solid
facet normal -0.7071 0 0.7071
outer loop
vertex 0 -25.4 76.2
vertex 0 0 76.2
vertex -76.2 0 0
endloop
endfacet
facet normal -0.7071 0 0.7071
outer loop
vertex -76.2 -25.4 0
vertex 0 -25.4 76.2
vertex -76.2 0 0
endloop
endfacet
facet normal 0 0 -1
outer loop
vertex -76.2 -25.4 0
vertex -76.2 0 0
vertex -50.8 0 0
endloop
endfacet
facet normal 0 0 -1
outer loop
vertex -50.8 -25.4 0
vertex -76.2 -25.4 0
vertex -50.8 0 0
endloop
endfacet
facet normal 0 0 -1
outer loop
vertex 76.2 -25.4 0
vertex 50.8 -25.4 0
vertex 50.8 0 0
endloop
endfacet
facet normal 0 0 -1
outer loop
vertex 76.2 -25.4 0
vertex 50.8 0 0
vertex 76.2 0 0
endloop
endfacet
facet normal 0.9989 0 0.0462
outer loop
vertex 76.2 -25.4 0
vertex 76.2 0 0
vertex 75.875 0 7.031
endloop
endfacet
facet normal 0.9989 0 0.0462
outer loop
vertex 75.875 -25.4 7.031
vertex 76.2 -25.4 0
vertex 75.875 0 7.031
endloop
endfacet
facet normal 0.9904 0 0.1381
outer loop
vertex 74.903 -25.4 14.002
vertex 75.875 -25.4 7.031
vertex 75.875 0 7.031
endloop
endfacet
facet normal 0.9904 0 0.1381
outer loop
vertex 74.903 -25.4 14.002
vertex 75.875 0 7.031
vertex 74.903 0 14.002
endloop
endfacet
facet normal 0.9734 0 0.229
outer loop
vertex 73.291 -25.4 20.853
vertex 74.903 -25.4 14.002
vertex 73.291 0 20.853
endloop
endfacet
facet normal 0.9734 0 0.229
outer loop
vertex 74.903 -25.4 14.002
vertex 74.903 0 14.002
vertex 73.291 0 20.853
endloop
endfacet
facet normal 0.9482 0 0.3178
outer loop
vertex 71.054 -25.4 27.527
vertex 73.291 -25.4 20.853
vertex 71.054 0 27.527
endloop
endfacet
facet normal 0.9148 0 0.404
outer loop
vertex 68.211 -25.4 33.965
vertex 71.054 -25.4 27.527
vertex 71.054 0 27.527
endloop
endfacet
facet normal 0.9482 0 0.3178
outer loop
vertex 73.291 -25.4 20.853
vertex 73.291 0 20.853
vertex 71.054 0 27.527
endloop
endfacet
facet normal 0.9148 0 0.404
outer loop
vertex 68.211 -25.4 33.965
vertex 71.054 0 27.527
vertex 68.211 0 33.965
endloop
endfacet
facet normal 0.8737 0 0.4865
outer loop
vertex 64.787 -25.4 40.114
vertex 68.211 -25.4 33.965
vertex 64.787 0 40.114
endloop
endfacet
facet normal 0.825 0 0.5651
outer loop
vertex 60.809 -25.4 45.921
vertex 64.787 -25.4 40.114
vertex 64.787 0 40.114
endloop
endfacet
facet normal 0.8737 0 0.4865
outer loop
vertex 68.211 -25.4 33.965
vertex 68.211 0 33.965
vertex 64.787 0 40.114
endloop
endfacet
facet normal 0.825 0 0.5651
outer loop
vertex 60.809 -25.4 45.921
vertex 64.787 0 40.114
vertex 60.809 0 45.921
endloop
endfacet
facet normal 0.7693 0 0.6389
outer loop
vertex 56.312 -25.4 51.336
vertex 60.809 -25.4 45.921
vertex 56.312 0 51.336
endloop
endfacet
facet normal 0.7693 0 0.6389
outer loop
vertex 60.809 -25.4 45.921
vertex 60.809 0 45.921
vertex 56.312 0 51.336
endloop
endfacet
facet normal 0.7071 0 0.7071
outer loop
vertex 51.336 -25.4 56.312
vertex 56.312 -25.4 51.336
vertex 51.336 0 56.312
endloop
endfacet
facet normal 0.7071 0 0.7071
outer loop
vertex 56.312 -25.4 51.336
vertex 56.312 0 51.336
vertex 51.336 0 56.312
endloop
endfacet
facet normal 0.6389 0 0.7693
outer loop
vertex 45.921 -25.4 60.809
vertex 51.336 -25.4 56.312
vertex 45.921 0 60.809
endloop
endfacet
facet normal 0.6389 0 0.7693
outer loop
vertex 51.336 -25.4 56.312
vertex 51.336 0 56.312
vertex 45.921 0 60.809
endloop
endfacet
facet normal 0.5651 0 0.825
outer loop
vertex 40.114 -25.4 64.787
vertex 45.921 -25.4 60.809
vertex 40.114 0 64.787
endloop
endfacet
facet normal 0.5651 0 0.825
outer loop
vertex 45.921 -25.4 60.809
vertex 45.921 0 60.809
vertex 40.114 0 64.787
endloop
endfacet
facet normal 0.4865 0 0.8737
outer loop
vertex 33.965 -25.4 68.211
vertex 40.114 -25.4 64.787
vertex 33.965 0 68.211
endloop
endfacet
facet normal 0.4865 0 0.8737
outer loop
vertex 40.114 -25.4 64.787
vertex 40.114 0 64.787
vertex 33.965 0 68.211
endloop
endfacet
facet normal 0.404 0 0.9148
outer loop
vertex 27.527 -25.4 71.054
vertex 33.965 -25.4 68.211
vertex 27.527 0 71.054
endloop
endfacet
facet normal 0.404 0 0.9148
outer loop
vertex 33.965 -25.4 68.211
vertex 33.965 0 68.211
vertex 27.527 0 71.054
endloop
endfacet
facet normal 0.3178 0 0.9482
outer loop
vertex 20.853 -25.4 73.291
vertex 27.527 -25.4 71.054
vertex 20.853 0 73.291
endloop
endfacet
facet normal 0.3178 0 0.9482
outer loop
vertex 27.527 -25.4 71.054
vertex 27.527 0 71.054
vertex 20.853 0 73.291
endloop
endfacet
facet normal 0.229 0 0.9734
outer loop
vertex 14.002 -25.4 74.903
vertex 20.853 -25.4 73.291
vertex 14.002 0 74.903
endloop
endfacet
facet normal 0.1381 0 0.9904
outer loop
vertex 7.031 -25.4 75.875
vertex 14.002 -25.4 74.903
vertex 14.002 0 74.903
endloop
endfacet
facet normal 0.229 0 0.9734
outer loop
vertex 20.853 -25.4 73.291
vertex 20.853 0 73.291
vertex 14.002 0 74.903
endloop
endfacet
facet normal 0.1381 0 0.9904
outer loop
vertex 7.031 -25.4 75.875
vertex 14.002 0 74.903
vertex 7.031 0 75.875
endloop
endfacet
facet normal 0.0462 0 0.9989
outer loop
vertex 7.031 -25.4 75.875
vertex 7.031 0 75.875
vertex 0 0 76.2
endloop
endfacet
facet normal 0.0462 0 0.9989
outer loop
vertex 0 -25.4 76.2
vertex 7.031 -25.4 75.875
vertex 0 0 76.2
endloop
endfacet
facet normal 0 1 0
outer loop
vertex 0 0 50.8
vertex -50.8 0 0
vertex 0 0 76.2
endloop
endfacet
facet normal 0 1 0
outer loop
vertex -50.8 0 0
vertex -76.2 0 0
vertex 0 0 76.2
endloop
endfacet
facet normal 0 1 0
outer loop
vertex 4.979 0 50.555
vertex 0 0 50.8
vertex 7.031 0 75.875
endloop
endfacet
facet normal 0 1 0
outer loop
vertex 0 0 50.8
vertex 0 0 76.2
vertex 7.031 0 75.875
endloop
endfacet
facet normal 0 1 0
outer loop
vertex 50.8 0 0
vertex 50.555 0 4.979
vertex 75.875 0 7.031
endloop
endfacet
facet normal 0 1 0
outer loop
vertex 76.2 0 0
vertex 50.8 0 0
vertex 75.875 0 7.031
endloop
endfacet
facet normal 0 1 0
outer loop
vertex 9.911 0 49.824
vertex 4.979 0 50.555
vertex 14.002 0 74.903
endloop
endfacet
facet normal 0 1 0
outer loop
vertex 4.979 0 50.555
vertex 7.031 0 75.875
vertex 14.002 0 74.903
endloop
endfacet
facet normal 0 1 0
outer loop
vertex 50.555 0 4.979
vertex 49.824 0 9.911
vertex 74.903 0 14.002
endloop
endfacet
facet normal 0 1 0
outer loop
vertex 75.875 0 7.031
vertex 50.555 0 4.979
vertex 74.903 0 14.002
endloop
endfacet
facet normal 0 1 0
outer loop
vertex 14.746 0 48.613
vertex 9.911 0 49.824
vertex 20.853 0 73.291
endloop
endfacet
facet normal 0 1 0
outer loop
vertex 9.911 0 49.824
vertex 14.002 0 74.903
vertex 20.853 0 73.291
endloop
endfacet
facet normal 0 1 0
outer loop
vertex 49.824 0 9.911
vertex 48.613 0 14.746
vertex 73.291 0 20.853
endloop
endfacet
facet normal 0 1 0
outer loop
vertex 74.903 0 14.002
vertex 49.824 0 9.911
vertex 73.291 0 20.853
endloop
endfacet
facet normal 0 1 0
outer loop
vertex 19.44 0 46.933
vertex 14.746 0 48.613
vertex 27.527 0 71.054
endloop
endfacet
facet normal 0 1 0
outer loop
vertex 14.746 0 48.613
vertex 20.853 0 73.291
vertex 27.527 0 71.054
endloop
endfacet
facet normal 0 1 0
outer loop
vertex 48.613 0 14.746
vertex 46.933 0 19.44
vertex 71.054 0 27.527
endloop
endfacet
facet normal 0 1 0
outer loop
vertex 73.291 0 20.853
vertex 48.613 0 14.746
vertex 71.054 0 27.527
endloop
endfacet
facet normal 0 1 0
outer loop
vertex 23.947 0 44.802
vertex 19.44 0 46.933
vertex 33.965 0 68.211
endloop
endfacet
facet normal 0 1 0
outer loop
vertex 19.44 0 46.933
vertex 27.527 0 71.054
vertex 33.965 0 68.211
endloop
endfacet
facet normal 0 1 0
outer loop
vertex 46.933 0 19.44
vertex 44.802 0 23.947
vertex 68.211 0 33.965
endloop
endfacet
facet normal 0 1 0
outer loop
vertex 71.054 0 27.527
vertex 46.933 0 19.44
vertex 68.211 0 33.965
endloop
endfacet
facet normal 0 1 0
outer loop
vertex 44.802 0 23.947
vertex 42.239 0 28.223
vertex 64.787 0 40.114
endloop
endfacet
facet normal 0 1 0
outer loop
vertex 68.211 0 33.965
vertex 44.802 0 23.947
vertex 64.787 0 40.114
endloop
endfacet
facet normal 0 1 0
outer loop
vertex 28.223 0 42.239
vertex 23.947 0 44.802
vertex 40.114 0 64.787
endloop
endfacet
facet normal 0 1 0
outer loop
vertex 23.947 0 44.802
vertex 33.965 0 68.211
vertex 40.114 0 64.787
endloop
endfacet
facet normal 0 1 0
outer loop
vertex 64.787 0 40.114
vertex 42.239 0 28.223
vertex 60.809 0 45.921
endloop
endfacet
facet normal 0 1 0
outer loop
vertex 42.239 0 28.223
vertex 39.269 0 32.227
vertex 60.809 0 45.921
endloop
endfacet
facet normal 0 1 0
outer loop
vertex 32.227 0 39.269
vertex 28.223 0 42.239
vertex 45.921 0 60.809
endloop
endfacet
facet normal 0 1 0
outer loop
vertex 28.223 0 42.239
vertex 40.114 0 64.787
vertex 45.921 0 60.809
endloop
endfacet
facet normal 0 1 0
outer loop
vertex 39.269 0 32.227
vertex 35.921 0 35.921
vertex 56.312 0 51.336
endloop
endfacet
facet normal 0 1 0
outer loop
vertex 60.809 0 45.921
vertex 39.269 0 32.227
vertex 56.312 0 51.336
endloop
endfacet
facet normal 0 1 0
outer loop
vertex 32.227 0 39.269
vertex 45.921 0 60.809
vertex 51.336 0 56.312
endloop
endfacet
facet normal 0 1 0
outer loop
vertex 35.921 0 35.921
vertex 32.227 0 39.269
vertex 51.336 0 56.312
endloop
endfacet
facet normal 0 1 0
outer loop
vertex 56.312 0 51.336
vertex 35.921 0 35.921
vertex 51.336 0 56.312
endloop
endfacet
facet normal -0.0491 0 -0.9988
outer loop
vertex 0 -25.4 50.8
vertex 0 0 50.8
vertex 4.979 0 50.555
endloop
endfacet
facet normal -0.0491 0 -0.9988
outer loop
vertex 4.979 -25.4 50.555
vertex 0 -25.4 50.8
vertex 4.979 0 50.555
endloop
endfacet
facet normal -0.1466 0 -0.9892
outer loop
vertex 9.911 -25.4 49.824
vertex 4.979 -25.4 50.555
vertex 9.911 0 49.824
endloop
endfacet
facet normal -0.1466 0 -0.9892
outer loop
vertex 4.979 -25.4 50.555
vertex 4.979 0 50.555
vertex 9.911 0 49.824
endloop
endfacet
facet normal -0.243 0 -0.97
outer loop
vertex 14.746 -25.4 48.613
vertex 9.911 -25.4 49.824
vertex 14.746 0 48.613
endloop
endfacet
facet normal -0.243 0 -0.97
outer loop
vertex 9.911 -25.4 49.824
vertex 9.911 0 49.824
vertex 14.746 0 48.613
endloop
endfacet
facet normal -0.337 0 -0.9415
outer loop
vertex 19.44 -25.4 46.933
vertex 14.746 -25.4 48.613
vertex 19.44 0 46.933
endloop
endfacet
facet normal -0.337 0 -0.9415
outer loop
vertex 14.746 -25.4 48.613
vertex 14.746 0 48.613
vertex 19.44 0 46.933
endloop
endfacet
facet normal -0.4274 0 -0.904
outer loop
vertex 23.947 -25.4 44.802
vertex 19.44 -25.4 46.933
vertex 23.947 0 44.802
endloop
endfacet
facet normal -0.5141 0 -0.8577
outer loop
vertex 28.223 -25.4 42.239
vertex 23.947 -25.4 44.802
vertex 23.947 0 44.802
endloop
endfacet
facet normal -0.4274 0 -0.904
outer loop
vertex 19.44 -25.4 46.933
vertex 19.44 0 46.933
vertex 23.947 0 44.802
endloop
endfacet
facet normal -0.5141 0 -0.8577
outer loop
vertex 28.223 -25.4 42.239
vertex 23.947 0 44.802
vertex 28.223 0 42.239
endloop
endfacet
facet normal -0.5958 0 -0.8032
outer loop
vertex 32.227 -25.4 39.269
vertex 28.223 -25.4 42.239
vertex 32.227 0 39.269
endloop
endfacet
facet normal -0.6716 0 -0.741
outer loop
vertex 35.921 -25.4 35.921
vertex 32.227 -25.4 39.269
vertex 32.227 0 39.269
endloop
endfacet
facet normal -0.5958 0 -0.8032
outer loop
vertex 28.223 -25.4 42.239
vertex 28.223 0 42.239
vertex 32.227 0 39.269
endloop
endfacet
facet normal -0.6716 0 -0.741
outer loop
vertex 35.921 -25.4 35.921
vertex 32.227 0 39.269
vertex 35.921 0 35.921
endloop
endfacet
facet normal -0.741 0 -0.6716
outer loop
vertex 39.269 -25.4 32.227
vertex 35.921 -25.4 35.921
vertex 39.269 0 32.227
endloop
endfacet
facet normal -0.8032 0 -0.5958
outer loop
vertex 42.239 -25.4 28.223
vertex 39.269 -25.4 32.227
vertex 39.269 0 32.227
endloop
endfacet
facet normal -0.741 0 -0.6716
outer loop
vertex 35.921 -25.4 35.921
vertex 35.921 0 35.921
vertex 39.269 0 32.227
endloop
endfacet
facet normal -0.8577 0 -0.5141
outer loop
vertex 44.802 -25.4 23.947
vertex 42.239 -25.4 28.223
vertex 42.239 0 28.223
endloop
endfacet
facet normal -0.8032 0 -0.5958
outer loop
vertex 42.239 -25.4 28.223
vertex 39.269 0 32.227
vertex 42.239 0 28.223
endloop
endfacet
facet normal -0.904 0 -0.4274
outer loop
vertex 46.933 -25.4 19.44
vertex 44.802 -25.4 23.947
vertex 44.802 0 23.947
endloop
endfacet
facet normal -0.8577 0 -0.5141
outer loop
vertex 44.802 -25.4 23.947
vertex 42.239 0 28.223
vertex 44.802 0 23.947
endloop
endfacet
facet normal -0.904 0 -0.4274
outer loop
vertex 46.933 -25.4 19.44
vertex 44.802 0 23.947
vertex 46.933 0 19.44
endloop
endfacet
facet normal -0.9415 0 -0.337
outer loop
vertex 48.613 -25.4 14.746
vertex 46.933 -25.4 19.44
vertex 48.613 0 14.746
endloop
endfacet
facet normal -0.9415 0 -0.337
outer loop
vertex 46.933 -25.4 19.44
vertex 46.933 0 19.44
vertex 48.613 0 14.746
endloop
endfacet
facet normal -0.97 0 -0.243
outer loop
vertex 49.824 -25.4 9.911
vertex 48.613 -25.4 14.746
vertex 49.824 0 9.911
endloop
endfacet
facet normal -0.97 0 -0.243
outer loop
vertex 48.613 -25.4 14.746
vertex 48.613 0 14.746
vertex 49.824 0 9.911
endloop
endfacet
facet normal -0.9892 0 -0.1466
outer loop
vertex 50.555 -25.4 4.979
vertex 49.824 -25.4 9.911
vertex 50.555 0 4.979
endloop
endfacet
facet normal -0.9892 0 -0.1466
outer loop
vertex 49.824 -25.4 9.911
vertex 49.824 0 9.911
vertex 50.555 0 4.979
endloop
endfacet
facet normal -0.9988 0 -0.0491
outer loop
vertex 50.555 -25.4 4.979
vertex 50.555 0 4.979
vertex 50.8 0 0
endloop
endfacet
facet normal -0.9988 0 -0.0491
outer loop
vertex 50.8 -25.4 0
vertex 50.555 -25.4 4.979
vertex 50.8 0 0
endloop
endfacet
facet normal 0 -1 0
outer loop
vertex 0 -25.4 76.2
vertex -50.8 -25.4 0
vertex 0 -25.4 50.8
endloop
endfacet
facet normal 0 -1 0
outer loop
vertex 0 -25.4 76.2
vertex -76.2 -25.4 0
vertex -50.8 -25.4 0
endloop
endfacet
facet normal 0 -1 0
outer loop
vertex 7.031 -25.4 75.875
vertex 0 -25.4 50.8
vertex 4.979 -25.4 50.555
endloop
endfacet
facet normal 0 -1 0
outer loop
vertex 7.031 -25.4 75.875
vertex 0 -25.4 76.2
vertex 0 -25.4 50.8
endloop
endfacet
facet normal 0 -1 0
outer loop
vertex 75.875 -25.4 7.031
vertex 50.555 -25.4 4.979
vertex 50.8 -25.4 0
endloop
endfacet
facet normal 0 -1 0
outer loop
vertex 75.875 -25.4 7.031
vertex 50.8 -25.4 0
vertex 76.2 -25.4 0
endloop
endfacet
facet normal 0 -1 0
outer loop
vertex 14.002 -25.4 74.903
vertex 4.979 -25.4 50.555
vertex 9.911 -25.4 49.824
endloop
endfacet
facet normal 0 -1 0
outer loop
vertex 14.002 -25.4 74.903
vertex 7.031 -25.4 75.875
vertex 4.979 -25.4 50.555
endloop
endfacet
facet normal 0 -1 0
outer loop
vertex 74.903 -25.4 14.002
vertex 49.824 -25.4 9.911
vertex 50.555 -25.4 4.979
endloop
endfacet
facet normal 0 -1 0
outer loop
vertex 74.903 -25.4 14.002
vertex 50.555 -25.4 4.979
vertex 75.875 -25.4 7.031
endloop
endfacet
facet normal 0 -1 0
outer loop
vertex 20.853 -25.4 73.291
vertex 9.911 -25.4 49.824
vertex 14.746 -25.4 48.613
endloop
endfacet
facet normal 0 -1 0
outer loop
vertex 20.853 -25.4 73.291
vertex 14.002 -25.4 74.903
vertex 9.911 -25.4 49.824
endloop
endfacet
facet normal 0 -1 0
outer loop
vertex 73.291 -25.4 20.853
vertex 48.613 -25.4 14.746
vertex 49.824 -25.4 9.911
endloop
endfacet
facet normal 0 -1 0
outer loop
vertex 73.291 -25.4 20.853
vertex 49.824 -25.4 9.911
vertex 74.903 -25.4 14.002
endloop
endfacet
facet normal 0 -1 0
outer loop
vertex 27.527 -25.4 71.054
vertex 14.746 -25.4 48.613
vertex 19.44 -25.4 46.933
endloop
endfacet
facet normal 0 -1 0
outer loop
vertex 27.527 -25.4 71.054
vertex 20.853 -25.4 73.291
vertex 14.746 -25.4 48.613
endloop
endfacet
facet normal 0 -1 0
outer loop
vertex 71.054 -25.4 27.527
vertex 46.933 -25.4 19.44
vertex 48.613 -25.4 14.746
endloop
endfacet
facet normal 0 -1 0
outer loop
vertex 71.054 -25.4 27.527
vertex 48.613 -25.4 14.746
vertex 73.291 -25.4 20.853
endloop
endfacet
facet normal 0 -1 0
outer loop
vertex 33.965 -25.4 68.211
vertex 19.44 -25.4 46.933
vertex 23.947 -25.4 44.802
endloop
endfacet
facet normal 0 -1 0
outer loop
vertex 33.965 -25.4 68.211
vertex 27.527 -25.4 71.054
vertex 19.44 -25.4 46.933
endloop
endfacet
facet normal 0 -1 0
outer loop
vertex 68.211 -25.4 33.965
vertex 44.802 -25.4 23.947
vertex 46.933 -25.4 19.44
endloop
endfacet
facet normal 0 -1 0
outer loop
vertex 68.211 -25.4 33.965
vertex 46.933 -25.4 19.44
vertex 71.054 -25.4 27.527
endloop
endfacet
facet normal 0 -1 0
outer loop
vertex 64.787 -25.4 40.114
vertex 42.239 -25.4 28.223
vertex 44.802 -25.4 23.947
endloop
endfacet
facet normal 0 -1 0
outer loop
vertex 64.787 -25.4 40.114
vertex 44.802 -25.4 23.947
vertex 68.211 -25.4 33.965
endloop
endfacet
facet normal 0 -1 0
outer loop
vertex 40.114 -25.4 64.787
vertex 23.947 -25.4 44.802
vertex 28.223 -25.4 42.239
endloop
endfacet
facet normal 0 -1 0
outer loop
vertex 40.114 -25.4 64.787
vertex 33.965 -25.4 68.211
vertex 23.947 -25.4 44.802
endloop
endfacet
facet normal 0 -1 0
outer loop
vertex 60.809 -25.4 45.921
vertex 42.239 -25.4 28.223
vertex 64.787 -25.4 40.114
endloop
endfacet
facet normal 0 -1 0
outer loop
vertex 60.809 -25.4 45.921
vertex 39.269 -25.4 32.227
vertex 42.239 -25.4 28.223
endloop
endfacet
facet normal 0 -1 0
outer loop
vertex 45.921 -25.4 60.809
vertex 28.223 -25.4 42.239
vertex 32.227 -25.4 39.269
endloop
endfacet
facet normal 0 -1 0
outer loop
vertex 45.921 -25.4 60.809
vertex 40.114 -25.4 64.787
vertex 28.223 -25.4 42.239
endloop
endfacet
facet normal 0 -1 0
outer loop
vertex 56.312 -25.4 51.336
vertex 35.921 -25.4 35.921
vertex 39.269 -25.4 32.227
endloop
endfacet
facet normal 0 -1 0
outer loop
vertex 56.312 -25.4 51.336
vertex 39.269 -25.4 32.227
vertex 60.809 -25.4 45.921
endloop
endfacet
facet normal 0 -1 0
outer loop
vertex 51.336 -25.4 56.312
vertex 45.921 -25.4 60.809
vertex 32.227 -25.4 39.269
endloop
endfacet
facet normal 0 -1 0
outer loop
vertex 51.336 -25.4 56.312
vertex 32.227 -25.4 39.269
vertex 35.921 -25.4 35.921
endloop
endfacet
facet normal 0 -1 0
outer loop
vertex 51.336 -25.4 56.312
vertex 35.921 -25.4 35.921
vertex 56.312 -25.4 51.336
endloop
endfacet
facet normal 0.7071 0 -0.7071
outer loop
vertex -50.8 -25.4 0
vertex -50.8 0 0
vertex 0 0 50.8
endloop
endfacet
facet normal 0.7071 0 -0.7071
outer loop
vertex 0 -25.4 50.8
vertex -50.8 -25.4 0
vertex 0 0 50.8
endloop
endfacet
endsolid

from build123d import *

# Parameters (mm, degrees)
F1_DEPTH = 25.4


with BuildPart() as f1:
    # F0 (on Front) → F1 (new body)
    with BuildSketch(Plane.XZ):
        Polygon((-50.8, 0), (0, 50.8), (0, 76.2), (-76.2, 0), align=None)
        with BuildLine():
            Line((0, 76.2), (0, 50.8))
            ThreePointArc((0, 50.8), (35.921024, 35.921024), (50.8, 0))
            Line((50.8, 0), (76.2, 0))
            ThreePointArc((76.2, 0), (53.881537, 53.881537), (0, 76.2))
        make_face()
    extrude(amount=F1_DEPTH)


solid = f1.part
